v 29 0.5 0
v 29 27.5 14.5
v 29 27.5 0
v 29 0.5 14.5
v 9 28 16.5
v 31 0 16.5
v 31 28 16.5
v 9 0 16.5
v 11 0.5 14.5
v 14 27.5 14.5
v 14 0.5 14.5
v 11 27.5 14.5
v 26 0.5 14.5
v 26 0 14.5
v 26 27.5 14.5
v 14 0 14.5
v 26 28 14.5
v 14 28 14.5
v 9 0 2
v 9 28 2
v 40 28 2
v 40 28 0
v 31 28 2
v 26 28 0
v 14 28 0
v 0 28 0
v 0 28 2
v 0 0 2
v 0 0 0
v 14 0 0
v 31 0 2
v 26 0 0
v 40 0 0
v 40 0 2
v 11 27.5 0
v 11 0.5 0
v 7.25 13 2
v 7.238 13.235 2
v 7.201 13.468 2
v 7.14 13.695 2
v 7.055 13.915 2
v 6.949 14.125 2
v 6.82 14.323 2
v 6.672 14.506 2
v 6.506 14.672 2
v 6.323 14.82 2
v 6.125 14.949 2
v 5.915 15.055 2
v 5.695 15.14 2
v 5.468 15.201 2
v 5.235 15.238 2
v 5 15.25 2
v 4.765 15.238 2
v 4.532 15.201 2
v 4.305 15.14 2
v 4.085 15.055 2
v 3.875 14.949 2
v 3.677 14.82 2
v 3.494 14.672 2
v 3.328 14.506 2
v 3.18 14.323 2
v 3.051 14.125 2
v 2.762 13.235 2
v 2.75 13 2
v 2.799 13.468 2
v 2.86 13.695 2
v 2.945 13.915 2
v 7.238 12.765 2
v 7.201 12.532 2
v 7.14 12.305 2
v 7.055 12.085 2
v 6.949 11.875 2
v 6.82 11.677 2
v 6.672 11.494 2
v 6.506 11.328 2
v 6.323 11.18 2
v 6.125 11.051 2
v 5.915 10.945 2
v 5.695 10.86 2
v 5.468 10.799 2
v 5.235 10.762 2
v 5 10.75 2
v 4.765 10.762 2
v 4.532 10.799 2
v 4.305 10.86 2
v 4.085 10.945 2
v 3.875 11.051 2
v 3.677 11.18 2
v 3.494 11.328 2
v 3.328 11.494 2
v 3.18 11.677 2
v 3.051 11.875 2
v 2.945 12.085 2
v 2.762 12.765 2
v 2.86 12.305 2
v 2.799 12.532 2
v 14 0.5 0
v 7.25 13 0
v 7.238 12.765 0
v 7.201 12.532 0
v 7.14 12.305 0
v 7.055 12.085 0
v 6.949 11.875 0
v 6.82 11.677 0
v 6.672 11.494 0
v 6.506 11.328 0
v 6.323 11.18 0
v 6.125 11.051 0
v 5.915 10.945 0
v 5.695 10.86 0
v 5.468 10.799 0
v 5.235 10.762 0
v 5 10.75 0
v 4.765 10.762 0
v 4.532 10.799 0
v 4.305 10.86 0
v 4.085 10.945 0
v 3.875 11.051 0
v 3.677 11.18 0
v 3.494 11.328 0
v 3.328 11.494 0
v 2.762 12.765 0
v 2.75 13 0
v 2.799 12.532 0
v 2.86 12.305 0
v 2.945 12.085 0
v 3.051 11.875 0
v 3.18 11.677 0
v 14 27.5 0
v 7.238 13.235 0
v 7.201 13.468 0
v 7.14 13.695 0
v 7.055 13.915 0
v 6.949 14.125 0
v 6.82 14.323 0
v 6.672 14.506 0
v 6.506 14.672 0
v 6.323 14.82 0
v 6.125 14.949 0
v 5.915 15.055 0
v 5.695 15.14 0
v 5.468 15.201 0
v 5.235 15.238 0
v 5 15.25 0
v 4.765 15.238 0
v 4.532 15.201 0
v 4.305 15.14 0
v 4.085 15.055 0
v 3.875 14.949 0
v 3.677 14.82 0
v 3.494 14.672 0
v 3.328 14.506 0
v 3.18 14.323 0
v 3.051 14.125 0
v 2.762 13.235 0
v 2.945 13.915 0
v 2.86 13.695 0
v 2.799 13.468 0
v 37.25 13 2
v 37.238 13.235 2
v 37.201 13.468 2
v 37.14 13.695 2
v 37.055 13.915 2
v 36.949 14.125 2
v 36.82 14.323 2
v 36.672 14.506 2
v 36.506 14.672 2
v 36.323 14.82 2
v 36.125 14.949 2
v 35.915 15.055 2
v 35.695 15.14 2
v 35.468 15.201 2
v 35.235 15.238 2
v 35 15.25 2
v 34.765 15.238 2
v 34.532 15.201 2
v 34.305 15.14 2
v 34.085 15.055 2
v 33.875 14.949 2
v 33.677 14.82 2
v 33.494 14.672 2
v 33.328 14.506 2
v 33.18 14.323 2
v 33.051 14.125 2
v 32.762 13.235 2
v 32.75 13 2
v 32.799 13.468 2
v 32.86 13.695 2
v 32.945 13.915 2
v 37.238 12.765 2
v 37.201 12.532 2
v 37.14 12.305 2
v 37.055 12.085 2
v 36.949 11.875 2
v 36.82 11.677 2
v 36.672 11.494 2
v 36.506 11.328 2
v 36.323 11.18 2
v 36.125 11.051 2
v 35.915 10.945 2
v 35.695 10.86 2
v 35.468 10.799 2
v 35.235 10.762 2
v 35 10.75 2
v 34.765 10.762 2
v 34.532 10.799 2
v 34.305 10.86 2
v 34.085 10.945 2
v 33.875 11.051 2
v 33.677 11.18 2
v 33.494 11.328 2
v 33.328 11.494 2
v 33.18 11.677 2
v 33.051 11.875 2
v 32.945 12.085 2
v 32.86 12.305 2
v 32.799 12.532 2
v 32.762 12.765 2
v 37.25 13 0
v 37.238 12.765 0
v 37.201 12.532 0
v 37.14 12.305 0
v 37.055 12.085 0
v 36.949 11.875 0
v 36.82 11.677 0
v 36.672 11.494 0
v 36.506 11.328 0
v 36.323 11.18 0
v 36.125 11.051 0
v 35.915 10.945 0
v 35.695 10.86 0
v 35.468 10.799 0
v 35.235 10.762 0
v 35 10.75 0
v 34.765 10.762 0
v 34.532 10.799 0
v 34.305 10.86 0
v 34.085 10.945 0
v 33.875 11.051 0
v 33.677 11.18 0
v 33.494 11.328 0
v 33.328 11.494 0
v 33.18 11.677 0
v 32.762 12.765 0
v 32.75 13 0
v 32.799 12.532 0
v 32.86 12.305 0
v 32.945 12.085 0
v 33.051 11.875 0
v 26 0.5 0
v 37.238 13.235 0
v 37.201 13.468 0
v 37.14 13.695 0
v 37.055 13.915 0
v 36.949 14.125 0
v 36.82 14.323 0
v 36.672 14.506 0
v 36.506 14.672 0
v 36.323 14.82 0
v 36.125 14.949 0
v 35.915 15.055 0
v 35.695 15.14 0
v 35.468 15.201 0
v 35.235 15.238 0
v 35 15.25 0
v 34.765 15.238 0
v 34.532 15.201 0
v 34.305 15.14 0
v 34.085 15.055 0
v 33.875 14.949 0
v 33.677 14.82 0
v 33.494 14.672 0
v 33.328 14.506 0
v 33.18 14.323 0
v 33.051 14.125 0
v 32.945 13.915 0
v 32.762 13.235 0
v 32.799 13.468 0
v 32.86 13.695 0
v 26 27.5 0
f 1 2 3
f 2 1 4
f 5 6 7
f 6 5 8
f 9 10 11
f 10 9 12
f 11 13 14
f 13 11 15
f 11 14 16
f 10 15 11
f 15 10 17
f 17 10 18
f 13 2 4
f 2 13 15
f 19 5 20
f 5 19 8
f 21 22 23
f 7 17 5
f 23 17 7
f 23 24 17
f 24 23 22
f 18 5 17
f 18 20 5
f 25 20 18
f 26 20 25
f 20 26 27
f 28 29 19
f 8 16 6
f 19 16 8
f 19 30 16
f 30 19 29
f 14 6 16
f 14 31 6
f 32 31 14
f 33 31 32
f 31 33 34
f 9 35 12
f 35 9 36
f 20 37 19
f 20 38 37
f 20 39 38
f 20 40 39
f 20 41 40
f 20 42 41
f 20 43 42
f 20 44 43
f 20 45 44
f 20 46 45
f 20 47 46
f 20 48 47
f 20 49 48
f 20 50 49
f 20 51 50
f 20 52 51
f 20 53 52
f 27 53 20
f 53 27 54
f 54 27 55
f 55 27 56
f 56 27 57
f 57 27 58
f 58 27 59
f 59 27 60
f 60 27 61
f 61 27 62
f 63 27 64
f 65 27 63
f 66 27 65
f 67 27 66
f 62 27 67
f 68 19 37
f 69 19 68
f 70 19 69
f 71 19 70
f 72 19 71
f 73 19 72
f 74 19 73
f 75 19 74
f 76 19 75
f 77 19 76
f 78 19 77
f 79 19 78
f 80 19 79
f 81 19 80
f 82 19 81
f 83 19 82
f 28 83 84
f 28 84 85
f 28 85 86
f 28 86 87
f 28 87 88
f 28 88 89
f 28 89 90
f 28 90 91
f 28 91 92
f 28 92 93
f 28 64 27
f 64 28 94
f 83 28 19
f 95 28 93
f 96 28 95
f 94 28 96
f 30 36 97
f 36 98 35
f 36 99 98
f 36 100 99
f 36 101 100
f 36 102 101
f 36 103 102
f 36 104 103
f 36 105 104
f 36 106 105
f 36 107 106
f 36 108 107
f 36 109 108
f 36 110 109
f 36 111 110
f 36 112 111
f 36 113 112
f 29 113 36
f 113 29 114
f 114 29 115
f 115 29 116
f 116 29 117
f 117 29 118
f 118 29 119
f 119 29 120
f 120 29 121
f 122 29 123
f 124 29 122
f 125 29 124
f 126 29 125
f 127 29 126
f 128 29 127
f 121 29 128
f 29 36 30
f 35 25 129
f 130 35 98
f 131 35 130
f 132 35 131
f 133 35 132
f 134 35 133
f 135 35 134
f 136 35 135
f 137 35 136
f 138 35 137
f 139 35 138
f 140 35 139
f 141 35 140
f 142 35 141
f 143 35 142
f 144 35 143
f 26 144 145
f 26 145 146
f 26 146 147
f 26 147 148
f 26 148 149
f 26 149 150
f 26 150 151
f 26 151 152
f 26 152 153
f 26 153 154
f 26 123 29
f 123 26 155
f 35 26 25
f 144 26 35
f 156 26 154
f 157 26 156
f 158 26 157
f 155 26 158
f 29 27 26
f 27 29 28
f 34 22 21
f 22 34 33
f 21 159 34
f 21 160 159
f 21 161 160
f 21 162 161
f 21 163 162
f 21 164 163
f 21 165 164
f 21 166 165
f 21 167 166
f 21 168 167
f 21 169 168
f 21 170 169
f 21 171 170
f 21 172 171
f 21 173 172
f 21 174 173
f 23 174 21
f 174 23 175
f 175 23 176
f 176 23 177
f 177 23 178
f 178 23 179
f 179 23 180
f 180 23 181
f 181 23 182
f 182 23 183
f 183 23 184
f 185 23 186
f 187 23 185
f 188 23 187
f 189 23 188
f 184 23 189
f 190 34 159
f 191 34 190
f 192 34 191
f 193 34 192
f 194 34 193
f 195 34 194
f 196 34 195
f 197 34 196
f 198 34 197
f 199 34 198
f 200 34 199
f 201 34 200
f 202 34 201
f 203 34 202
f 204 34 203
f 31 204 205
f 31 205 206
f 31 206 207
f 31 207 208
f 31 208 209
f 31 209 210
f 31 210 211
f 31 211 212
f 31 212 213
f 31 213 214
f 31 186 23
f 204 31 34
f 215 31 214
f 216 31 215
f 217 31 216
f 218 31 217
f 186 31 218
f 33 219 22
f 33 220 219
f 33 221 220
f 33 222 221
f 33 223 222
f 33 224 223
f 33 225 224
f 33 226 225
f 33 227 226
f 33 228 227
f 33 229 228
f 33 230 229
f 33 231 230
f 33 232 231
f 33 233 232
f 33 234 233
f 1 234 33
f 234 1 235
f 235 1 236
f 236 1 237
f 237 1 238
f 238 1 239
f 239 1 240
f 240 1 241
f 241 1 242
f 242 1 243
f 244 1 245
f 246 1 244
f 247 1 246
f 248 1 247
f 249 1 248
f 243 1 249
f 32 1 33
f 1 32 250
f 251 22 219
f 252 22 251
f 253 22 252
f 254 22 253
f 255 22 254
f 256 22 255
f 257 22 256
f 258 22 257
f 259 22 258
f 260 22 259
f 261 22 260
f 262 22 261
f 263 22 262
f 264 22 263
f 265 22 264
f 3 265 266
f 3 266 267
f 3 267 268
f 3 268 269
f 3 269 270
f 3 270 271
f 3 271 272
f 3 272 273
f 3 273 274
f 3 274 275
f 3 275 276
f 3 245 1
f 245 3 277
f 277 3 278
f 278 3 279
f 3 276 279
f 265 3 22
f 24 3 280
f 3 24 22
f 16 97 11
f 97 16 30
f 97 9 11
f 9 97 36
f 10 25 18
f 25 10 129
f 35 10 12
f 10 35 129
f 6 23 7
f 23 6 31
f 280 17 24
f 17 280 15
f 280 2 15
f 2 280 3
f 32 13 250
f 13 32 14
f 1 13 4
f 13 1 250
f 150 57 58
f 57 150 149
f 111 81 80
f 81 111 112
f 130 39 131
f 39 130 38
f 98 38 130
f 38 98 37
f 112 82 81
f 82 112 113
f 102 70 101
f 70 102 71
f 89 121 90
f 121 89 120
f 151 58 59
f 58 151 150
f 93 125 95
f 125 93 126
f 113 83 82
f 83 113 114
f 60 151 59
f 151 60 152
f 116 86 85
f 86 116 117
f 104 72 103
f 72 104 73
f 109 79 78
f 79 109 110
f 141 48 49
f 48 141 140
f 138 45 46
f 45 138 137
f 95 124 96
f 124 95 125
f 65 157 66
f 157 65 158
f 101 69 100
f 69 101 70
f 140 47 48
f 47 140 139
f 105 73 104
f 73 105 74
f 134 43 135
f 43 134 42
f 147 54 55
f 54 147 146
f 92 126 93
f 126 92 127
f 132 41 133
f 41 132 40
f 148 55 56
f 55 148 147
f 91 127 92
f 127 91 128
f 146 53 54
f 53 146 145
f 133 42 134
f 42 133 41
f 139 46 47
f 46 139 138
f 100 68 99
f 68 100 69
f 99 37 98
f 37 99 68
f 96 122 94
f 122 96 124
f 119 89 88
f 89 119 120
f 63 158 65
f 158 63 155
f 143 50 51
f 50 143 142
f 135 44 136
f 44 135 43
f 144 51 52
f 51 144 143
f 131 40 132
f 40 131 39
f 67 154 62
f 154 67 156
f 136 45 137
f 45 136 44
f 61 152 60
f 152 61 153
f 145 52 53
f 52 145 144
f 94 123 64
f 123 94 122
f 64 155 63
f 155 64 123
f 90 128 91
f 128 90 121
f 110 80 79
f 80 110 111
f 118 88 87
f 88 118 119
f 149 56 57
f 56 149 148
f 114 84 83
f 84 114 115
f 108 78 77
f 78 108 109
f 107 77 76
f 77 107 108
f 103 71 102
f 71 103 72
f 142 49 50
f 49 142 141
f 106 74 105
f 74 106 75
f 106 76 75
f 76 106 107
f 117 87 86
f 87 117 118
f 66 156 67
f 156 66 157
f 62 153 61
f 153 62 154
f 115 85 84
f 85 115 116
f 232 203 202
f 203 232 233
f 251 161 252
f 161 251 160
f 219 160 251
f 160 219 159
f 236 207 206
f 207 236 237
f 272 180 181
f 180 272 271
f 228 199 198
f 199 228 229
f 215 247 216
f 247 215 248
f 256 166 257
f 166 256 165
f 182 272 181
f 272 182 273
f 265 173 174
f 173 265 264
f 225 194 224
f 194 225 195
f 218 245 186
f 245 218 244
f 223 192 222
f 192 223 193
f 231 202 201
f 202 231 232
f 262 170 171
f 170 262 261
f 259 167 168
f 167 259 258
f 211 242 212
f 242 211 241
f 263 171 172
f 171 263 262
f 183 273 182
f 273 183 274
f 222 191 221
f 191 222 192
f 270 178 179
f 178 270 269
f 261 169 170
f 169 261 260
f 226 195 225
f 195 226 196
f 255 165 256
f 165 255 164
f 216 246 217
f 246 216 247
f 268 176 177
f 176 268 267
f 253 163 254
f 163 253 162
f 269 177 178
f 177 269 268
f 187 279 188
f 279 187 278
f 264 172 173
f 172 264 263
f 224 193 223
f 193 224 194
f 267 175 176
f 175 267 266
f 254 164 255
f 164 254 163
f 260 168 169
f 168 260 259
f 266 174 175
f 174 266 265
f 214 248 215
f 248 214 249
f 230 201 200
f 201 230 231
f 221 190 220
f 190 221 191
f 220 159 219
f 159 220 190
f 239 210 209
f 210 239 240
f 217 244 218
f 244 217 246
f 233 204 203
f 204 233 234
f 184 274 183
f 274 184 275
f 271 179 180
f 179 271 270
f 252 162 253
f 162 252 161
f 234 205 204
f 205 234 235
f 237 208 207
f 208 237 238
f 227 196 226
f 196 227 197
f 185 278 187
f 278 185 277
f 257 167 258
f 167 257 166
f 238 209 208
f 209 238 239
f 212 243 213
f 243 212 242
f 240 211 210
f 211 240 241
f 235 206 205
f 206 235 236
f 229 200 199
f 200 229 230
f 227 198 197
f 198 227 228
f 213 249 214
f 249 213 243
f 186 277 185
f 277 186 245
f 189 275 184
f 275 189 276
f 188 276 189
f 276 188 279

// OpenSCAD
// U Bracket - Corrected version for Tinkercad / OpenSCAD 
// Dimensions in mm

difference() {
    // Main solid U-shape
    union() {
        // Middle raised section
        translate([9, 0, 14.5])
            cube([20, 28, 2], center = false);
        // Left flange
        cube([11, 28, 2], center = false);
        // Right flange
        translate([29, 0, 0])
            cube([11, 28, 2], center = false);
        // Side walls connecting to middle
        translate([9, 0, 2])
            cube([2, 28, 14.5], center = false);
        translate([9, 0, 0])
            cube([5, 0.5, 14.5], center = false);
        translate([9, 27.5, 0])
            cube([5, 0.5, 14.5], center = false);
        translate([26, 27.5, 0])
            cube([5, 0.5, 14.5], center = false);
        translate([26, 0, 0])
            cube([5, 0.5, 14.5], center = false);
        translate([29, 0, 2])
            cube([2, 28, 14.5], center = false);
    }

    // Holes for M4 bolts (Ø4.5 mm)
    translate([5, 13, 1])
        cylinder(h = 4, r = 2.25, center = true, $fn = 60);
    translate([35, 13, 1])
        cylinder(h = 4, r = 2.25, center = true, $fn = 60);
}
